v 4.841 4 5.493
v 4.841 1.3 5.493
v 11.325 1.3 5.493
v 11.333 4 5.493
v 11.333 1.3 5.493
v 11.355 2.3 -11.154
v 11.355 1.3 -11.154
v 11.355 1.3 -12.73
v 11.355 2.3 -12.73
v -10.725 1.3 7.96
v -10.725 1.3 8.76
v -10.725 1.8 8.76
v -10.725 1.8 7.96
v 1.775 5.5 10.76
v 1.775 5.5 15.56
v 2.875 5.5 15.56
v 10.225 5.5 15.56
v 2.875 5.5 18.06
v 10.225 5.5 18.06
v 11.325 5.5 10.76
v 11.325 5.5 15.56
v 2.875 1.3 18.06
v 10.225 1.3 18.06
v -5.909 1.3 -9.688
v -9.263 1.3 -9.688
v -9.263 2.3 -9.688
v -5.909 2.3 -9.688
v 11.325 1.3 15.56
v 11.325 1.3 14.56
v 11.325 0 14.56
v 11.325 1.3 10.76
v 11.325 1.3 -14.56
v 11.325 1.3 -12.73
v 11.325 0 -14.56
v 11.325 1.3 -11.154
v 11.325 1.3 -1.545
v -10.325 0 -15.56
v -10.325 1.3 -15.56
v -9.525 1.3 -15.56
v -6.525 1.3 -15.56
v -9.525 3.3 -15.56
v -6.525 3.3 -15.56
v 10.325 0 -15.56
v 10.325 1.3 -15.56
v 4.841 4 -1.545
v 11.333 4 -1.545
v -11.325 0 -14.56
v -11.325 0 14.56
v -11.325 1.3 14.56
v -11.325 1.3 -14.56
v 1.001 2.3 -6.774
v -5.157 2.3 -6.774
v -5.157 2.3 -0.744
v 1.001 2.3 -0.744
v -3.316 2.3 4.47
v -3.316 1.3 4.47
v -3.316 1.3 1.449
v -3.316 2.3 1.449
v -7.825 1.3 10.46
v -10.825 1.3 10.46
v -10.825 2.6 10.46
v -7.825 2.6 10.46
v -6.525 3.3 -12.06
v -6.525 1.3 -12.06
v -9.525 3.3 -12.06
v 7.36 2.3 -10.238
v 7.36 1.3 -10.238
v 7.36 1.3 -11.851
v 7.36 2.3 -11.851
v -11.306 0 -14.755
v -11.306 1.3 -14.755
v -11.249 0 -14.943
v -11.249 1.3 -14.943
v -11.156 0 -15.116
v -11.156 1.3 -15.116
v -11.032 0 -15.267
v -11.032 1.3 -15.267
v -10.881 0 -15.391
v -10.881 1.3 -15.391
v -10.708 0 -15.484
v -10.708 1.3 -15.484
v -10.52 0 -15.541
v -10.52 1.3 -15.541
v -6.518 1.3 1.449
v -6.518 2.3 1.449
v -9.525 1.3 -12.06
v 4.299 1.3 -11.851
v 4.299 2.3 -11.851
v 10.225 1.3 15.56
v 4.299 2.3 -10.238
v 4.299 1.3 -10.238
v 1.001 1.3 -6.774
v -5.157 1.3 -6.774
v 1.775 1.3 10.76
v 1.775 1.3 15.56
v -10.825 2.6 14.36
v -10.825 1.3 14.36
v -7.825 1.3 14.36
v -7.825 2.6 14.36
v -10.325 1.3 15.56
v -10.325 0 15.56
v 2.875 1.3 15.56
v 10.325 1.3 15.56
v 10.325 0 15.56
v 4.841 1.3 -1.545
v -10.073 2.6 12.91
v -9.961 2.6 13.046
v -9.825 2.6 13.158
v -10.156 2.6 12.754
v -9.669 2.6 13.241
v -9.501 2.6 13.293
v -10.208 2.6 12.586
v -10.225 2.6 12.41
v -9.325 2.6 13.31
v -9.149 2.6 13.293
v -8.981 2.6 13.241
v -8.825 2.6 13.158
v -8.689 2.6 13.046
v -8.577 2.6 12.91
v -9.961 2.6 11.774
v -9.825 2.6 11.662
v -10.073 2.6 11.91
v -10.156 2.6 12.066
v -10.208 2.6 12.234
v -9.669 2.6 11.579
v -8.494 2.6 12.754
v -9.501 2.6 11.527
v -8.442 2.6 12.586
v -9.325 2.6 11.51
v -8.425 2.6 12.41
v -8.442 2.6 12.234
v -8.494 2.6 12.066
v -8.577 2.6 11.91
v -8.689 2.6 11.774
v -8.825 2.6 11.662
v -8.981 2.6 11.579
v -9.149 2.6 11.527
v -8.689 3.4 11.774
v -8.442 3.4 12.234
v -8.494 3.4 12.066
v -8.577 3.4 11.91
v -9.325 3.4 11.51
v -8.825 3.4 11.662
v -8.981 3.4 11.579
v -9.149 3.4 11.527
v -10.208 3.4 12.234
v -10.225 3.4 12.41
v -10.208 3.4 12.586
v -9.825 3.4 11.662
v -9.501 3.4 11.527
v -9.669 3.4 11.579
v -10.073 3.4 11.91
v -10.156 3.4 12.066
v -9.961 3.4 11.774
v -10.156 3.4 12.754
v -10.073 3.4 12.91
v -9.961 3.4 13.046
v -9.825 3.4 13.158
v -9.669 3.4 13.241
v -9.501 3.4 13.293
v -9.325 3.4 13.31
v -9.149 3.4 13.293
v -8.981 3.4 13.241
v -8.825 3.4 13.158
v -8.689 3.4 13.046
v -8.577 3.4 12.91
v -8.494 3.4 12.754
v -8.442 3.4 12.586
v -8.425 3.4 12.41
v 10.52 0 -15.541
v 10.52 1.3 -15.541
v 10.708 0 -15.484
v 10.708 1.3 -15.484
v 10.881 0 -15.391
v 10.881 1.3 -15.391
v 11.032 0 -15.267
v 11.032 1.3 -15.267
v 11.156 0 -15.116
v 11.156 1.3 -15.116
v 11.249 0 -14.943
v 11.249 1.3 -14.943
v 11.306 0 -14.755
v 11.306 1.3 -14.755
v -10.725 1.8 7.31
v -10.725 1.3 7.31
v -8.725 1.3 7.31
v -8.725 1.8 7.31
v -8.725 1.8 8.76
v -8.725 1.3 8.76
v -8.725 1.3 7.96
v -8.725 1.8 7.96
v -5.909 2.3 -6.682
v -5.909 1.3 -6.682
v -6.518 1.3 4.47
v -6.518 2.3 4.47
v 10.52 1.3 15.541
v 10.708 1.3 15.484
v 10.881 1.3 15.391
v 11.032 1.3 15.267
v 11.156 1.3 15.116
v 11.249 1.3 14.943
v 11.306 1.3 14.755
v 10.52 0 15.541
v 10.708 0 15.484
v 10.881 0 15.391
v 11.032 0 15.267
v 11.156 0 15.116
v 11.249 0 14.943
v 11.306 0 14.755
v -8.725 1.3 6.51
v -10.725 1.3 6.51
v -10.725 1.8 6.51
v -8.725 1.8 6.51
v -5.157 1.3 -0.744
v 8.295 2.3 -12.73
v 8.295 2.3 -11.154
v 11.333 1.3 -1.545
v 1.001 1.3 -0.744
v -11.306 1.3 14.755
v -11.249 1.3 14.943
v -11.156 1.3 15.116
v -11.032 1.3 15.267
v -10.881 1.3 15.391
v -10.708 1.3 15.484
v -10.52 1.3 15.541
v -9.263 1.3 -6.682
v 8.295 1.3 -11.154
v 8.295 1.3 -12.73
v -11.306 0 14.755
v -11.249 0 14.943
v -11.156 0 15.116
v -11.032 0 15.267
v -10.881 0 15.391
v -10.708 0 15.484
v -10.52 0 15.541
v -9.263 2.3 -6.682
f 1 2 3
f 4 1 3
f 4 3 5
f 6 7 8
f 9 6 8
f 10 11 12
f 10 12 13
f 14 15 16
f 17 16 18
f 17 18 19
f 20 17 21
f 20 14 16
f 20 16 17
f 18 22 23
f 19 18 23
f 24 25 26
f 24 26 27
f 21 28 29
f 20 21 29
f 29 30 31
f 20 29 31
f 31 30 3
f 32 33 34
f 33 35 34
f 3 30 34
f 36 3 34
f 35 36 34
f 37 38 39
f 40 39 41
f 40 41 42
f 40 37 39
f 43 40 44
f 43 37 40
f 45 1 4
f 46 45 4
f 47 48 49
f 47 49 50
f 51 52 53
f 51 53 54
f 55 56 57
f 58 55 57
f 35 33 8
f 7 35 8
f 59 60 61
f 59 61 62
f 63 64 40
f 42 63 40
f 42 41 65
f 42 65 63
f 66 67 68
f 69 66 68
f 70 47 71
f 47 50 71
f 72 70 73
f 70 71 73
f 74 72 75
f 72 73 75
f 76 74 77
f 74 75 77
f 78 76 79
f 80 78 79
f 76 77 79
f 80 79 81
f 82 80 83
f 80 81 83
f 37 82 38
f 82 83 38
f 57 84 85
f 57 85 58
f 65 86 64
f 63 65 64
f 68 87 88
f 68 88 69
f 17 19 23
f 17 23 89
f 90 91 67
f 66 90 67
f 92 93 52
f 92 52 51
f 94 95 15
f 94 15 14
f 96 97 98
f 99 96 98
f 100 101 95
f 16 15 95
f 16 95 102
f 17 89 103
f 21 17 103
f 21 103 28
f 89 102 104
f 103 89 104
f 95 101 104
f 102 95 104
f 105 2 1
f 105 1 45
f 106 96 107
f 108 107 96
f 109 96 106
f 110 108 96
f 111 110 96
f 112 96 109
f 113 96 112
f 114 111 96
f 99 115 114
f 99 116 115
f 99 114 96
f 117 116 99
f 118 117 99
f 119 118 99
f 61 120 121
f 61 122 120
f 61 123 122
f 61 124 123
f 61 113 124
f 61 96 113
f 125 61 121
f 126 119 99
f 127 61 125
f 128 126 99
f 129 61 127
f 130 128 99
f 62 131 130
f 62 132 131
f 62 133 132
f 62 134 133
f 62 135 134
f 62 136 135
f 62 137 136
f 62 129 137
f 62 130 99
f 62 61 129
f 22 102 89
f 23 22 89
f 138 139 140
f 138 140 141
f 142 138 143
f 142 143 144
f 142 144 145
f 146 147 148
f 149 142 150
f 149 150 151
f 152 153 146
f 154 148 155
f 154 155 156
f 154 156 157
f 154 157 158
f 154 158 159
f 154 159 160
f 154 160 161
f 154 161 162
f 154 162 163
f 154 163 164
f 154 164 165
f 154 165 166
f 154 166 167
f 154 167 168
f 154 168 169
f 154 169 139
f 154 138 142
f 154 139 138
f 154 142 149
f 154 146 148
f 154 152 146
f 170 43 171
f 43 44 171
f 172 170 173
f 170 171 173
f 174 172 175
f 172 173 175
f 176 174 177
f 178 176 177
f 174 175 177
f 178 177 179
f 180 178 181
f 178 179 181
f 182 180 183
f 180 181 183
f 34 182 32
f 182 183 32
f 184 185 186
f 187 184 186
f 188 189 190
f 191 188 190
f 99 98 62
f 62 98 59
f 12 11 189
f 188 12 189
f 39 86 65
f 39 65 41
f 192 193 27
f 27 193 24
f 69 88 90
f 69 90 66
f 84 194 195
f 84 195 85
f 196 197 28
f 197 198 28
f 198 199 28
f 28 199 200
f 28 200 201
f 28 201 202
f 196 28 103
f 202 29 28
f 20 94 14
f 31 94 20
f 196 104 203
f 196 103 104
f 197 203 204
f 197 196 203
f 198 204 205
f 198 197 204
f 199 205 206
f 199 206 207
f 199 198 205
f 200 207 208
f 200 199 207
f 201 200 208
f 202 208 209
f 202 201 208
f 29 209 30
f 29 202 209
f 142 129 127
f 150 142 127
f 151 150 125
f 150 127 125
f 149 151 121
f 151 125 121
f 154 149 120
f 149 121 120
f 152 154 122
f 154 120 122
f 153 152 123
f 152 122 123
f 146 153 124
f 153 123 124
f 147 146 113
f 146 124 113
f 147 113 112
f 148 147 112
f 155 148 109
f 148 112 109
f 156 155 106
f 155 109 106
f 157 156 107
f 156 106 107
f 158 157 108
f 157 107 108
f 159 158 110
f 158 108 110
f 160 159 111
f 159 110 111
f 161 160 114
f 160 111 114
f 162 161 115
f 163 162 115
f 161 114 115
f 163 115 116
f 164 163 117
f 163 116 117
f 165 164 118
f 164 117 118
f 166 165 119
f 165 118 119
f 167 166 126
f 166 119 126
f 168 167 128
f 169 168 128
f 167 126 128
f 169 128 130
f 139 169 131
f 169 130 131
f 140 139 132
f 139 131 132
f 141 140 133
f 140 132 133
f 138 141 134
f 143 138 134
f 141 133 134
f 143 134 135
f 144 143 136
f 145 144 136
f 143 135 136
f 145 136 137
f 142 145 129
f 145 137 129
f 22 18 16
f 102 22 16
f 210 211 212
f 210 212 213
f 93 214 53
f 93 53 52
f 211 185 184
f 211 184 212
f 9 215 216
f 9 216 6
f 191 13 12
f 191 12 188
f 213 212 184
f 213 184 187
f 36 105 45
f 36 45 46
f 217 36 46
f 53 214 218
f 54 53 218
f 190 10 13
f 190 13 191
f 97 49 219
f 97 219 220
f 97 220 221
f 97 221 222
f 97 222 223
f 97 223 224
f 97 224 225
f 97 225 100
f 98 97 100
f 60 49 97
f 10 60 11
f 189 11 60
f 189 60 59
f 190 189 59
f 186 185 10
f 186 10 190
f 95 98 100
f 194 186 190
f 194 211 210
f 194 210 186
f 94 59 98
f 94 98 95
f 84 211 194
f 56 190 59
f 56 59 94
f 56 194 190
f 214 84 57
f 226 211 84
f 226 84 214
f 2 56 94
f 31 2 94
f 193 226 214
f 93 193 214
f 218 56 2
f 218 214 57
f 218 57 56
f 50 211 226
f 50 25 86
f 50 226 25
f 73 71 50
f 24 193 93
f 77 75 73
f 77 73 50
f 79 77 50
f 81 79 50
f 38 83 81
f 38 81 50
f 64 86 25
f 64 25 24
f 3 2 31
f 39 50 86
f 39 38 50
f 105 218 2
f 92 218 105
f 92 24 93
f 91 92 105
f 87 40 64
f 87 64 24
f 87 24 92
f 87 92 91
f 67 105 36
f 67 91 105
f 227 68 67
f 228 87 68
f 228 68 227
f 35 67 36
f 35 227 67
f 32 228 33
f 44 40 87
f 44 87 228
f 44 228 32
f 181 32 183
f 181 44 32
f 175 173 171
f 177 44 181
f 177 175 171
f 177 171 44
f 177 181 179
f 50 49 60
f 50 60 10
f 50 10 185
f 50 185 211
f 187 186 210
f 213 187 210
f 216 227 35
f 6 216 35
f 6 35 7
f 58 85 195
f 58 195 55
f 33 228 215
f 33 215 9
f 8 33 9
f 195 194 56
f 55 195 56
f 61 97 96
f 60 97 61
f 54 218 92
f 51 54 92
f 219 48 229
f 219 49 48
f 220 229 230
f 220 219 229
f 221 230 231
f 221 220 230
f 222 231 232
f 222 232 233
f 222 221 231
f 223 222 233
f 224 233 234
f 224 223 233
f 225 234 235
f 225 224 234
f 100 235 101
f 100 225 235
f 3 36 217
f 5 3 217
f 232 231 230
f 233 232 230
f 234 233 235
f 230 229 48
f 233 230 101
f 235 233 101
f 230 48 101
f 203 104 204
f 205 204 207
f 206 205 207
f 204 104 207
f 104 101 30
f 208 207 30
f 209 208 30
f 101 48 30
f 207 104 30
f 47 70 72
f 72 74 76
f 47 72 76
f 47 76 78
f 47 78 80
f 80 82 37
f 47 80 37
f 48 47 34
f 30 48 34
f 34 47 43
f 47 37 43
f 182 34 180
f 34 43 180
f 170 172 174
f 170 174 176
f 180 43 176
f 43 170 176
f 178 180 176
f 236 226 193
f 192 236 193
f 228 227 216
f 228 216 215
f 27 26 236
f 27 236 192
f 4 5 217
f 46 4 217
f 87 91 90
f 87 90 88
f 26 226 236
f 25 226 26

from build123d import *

# Parameters (mm, degrees)
SKETCH1_W               = 22.65
SKETCH1_H               = 31.12
PCB_DEPTH               = 1.3
SKETCH2_W               = 9.55
SKETCH2_H               = 7.3
IO_CONNECTOR_DEPTH      = 4.2
SKETCH3_W               = 3
SKETCH3_H               = 3.5
ANTENNA_CONNECTOR_DEPTH = 2
SKETCH15_W              = 3
SKETCH15_H              = 3.9
BUTTON_BASE_DEPTH       = 1.3
SKETCH16_R              = 0.9
BUTTON_TIP_DEPTH        = 0.8
SKETCH17_W              = 6.157933233
SKETCH17_H              = 6.029642957
SKETCH17_W_2            = 3.353874351
SKETCH17_H_2            = 3.005657888
SKETCH17_W_3            = 3.060639434
SKETCH17_H_3            = 1.576137673
SKETCH17_H_4            = 1.612792038
SKETCH17_W_4            = 3.201337113
SKETCH17_H_5            = 3.020980094
LOW_CHIPS_DEPTH         = 1
SKETCH18_W              = 6.492852738
SKETCH18_H              = 7.038252368
HIGH_CHIPS_DEPTH        = 2.7
SKETCH23_W              = 2
SKETCH23_H              = 0.8
LEDS_DEPTH              = 0.5
CORNERS_R               = 1
CUT_EXTRUDE1_REACH      = 24.031
SKETCH24_W              = 1.1
SKETCH24_H              = 2.5


with BuildPart() as part:
    # Sketch1 → PCB (new body)
    with BuildSketch(Plane(origin=(0, 0, 0), x_dir=(1, 0, 0), z_dir=(0, 1, 0))):
        Rectangle(SKETCH1_W, SKETCH1_H)
    extrude(amount=PCB_DEPTH)

    # Sketch2 → IO connector (add)
    with BuildSketch(Plane(origin=(0, 1.3, 0), x_dir=(1, 0, 0), z_dir=(0, 1, 0))):
        with Locations((6.55, -14.41)):
            Rectangle(SKETCH2_W, SKETCH2_H)
    extrude(amount=IO_CONNECTOR_DEPTH)

    # Sketch3 → Antenna connector (add)
    with BuildSketch(Plane(origin=(0, 1.3, 0), x_dir=(1, 0, 0), z_dir=(0, 1, 0))):
        with Locations((-8.025, 13.81)):
            Rectangle(SKETCH3_W, SKETCH3_H)
    extrude(amount=ANTENNA_CONNECTOR_DEPTH)

    # Sketch15 → Button base (add)
    with BuildSketch(Plane(origin=(0, 1.3, 0), x_dir=(1, 0, 0), z_dir=(0, 1, 0))):
        with Locations((-9.325, -12.41)):
            Rectangle(SKETCH15_W, SKETCH15_H)
    extrude(amount=BUTTON_BASE_DEPTH)

    # Sketch16 → Button tip (add)
    with BuildSketch(Plane(origin=(0, 2.6, 0), x_dir=(1, 0, 0), z_dir=(0, 1, 0))):
        with Locations(Location((-9.325, -12.41, 0), (0, 0, 90))):
            Circle(SKETCH16_R)
    extrude(amount=BUTTON_TIP_DEPTH)

    # Sketch17 → Low chips (add)
    with BuildSketch(Plane(origin=(0, 1.3, 0), x_dir=(1, 0, 0), z_dir=(0, 1, 0))):
        with Locations((-2.078363242, 3.759055692)):
            Rectangle(SKETCH17_W, SKETCH17_H)
        with Locations((-7.585681506, 8.185070203)):
            Rectangle(SKETCH17_W_2, SKETCH17_H_2)
        with Locations((9.825141625, 11.942142563)):
            Rectangle(SKETCH17_W_3, SKETCH17_H_3)
        with Locations((5.829815896, 11.044110633)):
            Rectangle(SKETCH17_W_3, SKETCH17_H_4)
        with Locations((-4.917111521, -2.959047528)):
            Rectangle(SKETCH17_W_4, SKETCH17_H_5)
    extrude(amount=LOW_CHIPS_DEPTH)

    # Sketch18 → High chips (add)
    with BuildSketch(Plane(origin=(0, 1.3, 0), x_dir=(1, 0, 0), z_dir=(0, 1, 0))):
        with Locations((8.086930252, -1.973636887)):
            Rectangle(SKETCH18_W, SKETCH18_H)
    extrude(amount=HIGH_CHIPS_DEPTH)

    # Sketch23 → LEDs (add)
    with BuildSketch(Plane(origin=(0, 1.3, 0), x_dir=(1, 0, 0), z_dir=(0, 1, 0))):
        with Locations((-9.725, -8.36)):
            Rectangle(SKETCH23_W, SKETCH23_H)
        with Locations((-9.725, -6.91)):
            Rectangle(SKETCH23_W, SKETCH23_H)
    extrude(amount=LEDS_DEPTH)

    # Corners
    corners_edges = [part.edges().sort_by_distance(p)[0] for p in [
        (11.325, 0.65, 15.56),
        (-11.325, 0.65, 15.56),
        (-11.325, 0.65, -15.56),
        (11.325, 0.65, -15.56),
    ]]
    fillet(corners_edges, radius=CORNERS_R)

    # Sketch24 → Cut-Extrude1 (cut, up to next)
    with BuildSketch(Plane(origin=(0, 5.5, 0), x_dir=(1, 0, 0), z_dir=(0, 1, 0)), mode=Mode.PRIVATE) as cut_extrude1_sk1:
        with Locations((10.775, -16.81)):
            Rectangle(SKETCH24_W, SKETCH24_H)
    cut_extrude1_tool1 = extrude(cut_extrude1_sk1.sketch, amount=-CUT_EXTRUDE1_REACH, mode=Mode.PRIVATE) & part.part
    # Sketch24 → Cut-Extrude1 (cut, up to next)
    with BuildSketch(Plane(origin=(0, 5.5, 0), x_dir=(1, 0, 0), z_dir=(0, 1, 0)), mode=Mode.PRIVATE) as cut_extrude1_sk2:
        with Locations((2.325, -16.81)):
            Rectangle(SKETCH24_W, SKETCH24_H)
    cut_extrude1_tool2 = extrude(cut_extrude1_sk2.sketch, amount=-CUT_EXTRUDE1_REACH, mode=Mode.PRIVATE) & part.part
    add(cut_extrude1_tool1.solids().sort_by_distance((10.775, 5.5, 16.81))[0], mode=Mode.SUBTRACT)
    add(cut_extrude1_tool2.solids().sort_by_distance((2.325, 5.5, 16.81))[0], mode=Mode.SUBTRACT)


solid = part.part
